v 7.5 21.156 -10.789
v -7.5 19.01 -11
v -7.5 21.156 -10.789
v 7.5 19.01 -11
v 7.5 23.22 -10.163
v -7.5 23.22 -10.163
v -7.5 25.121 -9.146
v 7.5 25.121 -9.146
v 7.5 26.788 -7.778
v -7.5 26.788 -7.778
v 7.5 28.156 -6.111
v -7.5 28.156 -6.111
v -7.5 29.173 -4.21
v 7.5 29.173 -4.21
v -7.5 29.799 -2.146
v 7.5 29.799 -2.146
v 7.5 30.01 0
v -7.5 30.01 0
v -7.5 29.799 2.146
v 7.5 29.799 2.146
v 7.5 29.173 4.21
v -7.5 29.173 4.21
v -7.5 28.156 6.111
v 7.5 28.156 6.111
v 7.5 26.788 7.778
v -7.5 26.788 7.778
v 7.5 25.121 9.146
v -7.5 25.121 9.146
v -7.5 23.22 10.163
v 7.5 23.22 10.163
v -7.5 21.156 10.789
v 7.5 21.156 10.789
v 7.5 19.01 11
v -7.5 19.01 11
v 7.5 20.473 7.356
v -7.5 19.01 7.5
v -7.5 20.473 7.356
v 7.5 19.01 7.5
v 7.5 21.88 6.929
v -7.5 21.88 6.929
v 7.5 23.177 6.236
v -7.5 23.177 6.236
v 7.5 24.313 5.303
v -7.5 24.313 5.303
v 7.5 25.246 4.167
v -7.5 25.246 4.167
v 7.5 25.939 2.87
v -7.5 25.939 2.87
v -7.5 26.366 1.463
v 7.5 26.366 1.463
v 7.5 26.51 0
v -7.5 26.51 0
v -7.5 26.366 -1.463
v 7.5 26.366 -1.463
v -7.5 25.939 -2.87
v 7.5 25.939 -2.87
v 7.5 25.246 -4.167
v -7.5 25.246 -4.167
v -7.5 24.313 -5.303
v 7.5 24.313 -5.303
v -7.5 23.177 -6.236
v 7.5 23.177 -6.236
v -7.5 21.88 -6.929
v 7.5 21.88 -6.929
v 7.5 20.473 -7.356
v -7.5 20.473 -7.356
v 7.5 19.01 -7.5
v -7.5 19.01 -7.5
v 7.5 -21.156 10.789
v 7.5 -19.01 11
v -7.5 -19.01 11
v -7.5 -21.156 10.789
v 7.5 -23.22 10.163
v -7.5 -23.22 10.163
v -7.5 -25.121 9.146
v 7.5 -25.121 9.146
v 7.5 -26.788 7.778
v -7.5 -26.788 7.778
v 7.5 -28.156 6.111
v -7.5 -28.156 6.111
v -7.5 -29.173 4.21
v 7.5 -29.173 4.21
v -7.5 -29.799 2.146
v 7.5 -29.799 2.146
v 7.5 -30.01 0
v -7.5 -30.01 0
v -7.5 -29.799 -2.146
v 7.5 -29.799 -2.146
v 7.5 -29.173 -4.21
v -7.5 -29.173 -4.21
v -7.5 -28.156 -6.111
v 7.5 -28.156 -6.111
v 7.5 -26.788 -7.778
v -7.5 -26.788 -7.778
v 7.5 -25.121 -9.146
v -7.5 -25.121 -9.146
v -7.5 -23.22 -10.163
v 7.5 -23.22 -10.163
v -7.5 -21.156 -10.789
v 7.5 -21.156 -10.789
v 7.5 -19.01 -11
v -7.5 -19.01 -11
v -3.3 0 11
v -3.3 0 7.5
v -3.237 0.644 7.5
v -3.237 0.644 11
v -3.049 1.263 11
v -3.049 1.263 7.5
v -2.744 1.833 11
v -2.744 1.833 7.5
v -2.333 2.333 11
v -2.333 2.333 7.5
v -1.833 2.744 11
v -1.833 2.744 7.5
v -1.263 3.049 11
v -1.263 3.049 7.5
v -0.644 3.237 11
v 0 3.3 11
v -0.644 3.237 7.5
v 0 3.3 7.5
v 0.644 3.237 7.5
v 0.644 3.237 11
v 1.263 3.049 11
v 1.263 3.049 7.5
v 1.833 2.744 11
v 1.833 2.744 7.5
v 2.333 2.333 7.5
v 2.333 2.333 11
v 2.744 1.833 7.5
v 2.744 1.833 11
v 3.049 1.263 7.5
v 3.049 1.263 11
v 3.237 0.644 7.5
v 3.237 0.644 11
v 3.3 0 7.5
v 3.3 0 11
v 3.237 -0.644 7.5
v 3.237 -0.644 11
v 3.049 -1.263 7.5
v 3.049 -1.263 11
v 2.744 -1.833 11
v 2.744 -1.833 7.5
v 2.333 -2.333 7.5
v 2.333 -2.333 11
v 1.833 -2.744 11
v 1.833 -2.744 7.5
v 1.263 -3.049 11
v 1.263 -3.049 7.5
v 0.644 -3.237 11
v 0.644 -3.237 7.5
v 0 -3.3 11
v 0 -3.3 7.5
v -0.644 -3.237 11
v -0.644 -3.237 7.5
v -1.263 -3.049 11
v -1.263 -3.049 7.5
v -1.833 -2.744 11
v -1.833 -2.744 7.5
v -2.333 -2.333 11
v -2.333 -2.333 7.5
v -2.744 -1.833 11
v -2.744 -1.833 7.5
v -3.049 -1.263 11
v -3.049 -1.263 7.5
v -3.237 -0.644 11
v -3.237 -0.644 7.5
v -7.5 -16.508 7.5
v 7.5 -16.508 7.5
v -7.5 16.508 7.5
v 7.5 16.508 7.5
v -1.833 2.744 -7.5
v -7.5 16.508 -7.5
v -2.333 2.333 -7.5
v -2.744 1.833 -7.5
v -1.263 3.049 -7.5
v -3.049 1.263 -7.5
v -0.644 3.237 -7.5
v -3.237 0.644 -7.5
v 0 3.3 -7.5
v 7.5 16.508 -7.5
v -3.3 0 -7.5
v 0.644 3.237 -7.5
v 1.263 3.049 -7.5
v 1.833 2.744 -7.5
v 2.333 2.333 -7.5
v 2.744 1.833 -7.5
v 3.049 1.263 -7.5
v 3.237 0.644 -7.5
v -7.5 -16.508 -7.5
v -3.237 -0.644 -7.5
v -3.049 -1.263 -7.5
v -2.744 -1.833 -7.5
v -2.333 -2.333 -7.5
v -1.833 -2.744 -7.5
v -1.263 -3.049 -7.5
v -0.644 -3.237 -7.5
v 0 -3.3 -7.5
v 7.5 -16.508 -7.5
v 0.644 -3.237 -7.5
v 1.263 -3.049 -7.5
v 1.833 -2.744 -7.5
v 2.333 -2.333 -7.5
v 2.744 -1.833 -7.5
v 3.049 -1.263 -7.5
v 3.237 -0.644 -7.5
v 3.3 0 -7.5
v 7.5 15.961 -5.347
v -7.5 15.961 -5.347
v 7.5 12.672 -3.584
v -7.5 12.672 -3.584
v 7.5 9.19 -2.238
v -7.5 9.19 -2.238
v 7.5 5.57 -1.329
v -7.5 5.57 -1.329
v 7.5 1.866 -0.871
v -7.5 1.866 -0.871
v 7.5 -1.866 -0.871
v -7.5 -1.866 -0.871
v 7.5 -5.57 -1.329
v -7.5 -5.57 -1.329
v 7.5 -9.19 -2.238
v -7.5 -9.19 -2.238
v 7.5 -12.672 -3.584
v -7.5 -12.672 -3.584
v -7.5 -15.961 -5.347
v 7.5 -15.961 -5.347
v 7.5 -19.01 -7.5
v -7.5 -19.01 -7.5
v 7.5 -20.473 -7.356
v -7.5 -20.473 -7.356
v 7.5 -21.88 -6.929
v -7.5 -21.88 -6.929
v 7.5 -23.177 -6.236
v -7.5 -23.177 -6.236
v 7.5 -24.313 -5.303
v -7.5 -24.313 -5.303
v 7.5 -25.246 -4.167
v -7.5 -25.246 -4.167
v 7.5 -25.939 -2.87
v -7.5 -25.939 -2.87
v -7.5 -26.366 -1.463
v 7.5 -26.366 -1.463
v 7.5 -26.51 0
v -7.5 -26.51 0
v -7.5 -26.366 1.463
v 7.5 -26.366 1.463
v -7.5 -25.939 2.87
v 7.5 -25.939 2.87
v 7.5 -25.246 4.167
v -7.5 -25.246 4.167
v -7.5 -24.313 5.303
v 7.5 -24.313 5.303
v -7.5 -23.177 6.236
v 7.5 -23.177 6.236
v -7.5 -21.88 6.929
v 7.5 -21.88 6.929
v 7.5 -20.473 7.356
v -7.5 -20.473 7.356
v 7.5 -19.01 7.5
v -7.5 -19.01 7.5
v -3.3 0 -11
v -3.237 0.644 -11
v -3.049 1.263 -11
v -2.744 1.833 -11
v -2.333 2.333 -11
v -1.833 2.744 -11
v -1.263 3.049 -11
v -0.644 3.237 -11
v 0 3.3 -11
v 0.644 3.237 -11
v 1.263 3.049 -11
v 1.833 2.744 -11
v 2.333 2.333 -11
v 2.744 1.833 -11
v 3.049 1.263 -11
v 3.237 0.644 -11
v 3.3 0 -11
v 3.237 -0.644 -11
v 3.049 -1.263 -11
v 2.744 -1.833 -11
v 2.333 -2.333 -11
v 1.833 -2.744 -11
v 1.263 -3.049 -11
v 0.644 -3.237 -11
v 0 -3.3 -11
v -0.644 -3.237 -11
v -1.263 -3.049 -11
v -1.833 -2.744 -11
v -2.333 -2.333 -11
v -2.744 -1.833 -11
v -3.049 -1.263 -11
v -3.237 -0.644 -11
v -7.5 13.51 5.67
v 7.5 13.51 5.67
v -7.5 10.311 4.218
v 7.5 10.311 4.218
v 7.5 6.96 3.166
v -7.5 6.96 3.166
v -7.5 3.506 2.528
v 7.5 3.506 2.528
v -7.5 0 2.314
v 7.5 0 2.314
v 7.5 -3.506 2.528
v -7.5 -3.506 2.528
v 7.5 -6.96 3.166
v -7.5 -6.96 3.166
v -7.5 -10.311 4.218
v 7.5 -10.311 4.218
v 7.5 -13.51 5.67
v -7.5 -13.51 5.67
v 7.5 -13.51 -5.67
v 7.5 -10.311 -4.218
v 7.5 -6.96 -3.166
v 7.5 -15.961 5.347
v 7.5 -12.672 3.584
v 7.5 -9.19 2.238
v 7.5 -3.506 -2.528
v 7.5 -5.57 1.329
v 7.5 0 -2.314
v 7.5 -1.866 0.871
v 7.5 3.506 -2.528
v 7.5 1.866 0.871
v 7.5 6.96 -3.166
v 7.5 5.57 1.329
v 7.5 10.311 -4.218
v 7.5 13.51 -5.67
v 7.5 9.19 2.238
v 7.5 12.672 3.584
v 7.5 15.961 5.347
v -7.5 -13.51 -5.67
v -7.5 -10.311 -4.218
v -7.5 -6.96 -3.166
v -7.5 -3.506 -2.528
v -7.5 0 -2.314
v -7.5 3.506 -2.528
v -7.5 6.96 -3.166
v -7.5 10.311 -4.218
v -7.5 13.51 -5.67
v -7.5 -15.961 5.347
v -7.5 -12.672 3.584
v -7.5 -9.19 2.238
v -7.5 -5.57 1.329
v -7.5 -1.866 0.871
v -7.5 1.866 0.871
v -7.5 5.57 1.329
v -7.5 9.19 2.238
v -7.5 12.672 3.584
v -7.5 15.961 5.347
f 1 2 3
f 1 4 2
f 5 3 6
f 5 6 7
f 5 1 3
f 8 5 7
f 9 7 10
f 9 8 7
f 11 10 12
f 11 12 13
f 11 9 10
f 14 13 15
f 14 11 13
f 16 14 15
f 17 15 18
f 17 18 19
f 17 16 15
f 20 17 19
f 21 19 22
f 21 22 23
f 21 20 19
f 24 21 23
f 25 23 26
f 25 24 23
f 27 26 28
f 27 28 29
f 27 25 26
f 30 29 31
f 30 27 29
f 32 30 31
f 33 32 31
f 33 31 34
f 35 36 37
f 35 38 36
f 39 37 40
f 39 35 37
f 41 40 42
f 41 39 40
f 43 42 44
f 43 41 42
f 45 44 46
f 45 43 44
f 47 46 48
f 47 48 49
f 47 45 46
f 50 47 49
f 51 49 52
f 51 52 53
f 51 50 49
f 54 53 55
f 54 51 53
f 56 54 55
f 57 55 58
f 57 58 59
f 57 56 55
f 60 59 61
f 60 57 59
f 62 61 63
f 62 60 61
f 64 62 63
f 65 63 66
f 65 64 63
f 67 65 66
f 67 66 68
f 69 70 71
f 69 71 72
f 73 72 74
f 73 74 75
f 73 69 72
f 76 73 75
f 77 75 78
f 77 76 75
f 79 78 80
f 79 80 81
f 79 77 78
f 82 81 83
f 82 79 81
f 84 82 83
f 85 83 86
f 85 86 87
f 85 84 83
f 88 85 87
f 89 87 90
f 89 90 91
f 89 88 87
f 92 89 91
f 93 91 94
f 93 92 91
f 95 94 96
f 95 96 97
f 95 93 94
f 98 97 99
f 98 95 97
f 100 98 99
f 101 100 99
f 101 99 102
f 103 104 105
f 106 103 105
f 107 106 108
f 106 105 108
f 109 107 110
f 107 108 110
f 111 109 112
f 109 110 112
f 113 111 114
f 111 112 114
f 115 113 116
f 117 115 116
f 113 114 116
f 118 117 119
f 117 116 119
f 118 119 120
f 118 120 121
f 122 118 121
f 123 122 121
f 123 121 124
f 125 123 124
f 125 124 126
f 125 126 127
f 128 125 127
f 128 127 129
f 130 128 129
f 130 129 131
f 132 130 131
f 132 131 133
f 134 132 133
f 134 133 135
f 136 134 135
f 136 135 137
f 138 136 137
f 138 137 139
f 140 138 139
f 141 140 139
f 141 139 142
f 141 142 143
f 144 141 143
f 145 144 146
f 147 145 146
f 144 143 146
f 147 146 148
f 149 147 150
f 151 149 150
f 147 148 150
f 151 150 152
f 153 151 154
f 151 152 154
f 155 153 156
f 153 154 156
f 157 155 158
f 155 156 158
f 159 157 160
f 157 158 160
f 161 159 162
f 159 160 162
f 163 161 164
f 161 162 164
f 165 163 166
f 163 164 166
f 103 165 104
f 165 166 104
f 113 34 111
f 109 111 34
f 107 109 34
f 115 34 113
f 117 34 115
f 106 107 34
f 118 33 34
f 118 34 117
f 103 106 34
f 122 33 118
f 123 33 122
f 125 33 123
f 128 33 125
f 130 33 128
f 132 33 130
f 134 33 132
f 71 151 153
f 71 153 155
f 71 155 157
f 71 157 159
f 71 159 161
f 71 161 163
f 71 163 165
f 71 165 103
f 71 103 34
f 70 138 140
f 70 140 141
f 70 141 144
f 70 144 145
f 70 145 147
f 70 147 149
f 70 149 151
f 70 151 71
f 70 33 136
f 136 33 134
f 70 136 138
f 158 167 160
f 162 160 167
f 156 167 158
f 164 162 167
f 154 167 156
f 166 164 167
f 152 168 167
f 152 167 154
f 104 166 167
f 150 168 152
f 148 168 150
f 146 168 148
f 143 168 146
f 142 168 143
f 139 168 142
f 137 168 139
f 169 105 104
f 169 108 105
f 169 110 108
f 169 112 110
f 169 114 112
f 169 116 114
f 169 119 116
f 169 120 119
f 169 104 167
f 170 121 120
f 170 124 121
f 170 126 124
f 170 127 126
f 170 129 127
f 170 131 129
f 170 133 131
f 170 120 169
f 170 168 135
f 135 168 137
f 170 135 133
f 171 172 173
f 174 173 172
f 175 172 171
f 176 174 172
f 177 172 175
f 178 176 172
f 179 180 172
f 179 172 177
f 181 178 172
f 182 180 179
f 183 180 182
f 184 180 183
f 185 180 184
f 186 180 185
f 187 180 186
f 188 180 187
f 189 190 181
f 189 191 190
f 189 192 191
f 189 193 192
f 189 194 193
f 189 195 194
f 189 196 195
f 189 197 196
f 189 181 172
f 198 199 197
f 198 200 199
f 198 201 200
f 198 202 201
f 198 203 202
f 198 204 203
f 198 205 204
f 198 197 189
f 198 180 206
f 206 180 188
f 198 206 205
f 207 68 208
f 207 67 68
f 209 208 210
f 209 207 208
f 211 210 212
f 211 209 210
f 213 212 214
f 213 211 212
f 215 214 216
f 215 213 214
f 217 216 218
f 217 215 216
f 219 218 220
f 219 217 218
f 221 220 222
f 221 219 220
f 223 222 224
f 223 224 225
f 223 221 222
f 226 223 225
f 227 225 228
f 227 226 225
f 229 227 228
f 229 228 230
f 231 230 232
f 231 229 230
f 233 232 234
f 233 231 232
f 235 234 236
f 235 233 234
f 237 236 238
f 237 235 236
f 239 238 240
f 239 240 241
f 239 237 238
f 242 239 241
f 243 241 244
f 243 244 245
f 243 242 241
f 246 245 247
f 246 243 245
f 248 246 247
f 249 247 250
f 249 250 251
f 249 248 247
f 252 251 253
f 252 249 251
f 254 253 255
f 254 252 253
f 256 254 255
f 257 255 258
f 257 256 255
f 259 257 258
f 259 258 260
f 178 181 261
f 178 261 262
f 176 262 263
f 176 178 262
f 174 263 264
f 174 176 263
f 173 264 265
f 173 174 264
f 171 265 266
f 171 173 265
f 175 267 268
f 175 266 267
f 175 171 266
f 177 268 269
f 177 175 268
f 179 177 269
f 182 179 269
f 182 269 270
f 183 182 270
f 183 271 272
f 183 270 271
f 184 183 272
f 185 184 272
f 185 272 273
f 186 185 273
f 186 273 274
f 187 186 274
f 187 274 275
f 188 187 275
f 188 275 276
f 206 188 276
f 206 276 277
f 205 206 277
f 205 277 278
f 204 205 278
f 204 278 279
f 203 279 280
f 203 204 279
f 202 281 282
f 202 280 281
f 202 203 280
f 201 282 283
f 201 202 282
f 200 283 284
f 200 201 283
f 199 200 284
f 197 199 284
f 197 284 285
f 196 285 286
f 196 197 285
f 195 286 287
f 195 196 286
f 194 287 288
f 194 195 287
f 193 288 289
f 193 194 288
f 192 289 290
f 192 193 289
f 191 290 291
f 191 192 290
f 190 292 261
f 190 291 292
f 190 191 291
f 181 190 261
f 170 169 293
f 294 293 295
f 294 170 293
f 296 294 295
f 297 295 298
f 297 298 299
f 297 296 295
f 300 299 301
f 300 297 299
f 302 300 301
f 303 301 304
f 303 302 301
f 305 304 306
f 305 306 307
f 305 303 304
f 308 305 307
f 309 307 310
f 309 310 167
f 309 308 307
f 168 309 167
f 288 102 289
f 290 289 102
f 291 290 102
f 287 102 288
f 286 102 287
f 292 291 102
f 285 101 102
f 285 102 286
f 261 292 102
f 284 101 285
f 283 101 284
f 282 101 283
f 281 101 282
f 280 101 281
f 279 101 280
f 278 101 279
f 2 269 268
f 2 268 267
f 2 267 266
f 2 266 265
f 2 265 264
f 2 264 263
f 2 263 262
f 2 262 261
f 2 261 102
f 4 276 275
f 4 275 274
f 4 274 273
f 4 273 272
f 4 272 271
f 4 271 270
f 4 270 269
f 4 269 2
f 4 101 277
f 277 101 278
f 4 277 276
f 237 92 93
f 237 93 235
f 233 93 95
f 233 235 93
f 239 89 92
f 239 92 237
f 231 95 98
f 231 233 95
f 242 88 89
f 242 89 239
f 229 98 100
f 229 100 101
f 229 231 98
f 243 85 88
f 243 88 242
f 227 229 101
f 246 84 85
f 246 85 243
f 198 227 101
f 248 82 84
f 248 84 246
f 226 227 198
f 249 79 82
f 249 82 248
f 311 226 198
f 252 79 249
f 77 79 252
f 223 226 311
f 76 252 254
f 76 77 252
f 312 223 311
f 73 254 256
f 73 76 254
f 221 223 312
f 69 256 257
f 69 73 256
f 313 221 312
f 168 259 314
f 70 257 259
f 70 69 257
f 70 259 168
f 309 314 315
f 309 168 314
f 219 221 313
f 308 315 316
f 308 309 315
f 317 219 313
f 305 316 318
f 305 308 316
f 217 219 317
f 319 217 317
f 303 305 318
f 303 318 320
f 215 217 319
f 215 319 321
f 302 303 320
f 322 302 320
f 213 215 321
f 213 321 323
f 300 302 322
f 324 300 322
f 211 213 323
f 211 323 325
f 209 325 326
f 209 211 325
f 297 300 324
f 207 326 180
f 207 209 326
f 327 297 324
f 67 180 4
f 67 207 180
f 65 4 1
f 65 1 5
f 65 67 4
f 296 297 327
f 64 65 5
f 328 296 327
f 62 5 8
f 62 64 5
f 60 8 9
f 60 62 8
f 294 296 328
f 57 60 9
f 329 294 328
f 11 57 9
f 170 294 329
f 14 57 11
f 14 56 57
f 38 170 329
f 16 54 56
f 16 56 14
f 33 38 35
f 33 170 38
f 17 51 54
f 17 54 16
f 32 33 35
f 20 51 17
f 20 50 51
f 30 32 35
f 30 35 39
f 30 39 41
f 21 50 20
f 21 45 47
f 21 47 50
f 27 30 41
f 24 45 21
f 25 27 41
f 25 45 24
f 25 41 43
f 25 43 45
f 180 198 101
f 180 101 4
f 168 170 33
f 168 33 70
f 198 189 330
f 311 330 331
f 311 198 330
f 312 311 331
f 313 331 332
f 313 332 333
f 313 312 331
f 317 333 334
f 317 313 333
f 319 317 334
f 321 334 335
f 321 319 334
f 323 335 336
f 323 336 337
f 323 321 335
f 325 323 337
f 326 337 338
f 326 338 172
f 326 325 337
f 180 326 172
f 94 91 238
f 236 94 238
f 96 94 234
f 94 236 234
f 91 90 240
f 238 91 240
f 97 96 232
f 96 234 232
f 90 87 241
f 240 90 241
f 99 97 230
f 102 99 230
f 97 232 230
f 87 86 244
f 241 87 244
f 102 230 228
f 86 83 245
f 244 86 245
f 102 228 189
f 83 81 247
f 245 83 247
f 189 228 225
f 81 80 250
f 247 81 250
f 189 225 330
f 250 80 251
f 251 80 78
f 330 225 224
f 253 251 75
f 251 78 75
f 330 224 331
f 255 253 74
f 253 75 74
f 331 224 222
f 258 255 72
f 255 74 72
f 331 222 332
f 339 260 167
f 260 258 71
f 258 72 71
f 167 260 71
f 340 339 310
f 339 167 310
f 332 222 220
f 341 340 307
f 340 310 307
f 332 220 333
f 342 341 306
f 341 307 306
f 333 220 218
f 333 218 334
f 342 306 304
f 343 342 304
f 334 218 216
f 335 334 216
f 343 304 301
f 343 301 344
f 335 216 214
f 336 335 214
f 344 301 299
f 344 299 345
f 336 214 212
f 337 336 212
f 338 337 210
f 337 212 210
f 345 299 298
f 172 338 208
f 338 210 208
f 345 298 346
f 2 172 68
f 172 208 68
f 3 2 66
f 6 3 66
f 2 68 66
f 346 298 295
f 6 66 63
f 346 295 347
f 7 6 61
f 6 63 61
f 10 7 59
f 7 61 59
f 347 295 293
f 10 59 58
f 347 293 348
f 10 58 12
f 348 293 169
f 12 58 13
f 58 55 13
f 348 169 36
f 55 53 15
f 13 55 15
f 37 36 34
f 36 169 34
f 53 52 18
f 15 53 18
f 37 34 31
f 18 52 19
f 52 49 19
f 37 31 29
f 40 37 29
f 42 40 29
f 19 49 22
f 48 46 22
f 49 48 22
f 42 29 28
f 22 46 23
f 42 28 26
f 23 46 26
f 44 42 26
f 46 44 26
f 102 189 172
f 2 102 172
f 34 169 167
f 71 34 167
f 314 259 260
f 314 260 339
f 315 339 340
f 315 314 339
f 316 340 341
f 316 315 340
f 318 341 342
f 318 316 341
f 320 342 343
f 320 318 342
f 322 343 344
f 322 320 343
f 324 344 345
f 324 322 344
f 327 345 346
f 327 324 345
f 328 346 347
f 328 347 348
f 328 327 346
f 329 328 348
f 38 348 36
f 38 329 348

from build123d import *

# Parameters (mm, degrees)
F1_DEPTH = 7.5
F3_D     = 6.6
F3_DEPTH = 4
F3_TIP   = 1.9828400428


# Not quite as in the source:
# - a pattern or mirror of a feature is missing from the dataset's text; its kind, count and spacing are read off the source's solid


with BuildPart() as f1:
    # F0 (on Right) → F1 (new body, symmetric)
    with BuildSketch(Plane.YZ):
        with BuildLine():
            Line((19.0101097905, 11), (-19.0101097905, 11))
            ThreePointArc((-19.0101097905, 11), (-30.0101097905, 0), (-19.0101097905, -11))
            Line((-19.0101097905, -11), (19.0101097905, -11))
            ThreePointArc((19.0101097905, -11), (30.0101097905, 0), (19.0101097905, 11))
        make_face()
        with BuildLine():
            Line((16.508441914, -7.5), (-16.508441914, -7.5))
            ThreePointArc((-16.508441914, -7.5), (0, -2.3140263028), (16.508441914, -7.5))
        make_face(mode=Mode.SUBTRACT)
        with BuildLine():
            ThreePointArc((-19.0101097905, -7.5), (-26.5101097905, 0), (-19.0101097905, 7.5))
            ThreePointArc((-19.0101097905, 7.5), (0, 0.8140263028), (19.0101097905, 7.5))
            ThreePointArc((19.0101097905, 7.5), (26.5101097905, 0), (19.0101097905, -7.5))
            ThreePointArc((19.0101097905, -7.5), (0, -0.8140263028), (-19.0101097905, -7.5))
        make_face(mode=Mode.SUBTRACT)
        with BuildLine():
            ThreePointArc((16.508441914, 7.5), (0, 2.3140263028), (-16.508441914, 7.5))
            Line((-16.508441914, 7.5), (16.508441914, 7.5))
        make_face(mode=Mode.SUBTRACT)
    extrude(amount=F1_DEPTH, both=True)

    # F3
    with Locations(Plane.XY.offset(11)):
        with Locations((0, 0)):
            f3 = Hole(F3_D / 2, depth=F3_DEPTH)
            with Locations((0, 0, -(F3_DEPTH + F3_TIP / 2))):  # 118° drill point
                Cone(0, F3_D / 2, F3_TIP, mode=Mode.SUBTRACT)

    # F3_copies: F3 across plane
    add(f3.mirror(Plane(origin=(0, 0, 0), x_dir=(-1, 0, 0), z_dir=(0, 0, -1))), mode=Mode.SUBTRACT)


solid = f1.part
